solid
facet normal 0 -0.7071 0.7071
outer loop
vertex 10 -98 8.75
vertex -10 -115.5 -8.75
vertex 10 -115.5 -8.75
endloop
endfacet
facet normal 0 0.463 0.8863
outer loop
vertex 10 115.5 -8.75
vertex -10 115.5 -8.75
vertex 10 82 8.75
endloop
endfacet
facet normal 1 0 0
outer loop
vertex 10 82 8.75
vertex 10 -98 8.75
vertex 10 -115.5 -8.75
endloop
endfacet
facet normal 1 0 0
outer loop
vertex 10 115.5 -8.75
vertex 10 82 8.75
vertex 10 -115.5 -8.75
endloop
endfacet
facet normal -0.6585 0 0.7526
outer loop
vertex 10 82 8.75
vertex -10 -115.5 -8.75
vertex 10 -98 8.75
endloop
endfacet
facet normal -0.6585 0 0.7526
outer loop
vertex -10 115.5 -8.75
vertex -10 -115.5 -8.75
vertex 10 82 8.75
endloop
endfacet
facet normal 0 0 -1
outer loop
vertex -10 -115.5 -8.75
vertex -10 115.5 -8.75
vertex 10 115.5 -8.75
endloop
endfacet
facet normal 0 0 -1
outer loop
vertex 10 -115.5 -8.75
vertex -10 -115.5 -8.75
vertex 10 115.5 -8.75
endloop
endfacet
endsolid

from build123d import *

# Parameters (mm, degrees)
F0_W     = 20
F0_H     = 231
F1_DEPTH = 8.75
F2_SIZE2 = 17.49999
F2_SIZE  = 17.49999
F3_SIZE2 = 33.49999
F3_SIZE  = 17.49999
F4_SIZE2 = 17.49999
F4_SIZE  = 19.99999


# Not quite as in the source:
# - a fillet or chamfer is up to 0.001 mm smaller than in the source, because OpenCascade refuses the exact size


with BuildPart() as f1:
    # F0 (on Top) → F1 (new body, symmetric)
    with BuildSketch(Plane.XY):
        Rectangle(F0_W, F0_H)
    extrude(amount=F1_DEPTH, both=True)

    # F2 (size 17.5 and 17.5 in the source; OpenCascade refuses exactly that, so slightly less here)
    f2_edges = [f1.edges().sort_by_distance(p)[0] for p in [
        (0, -115.5, 8.75),
    ]]
    chamfer(f2_edges, length=F2_SIZE, length2=F2_SIZE2)

    # F3 (size 17.5 and 33.5 in the source; OpenCascade refuses exactly that, so slightly less here)
    f3_edges = [f1.edges().sort_by_distance(p)[0] for p in [
        (0, 115.5, 8.75),
    ]]
    f3_side = f1.faces().sort_by_distance((0, 115.5, 0))[0]
    chamfer(f3_edges, length=F3_SIZE, length2=F3_SIZE2, reference=f3_side)

    # F4 (size 20 and 17.5 in the source; OpenCascade refuses exactly that, so slightly less here)
    f4_edges = [f1.edges().sort_by_distance(p)[0] for p in [
        (-10, -8, 8.75),
    ]]
    f4_side = f1.faces().sort_by_distance((0, -8, 8.75))[0]
    chamfer(f4_edges, length=F4_SIZE, length2=F4_SIZE2, reference=f4_side)


solid = f1.part
